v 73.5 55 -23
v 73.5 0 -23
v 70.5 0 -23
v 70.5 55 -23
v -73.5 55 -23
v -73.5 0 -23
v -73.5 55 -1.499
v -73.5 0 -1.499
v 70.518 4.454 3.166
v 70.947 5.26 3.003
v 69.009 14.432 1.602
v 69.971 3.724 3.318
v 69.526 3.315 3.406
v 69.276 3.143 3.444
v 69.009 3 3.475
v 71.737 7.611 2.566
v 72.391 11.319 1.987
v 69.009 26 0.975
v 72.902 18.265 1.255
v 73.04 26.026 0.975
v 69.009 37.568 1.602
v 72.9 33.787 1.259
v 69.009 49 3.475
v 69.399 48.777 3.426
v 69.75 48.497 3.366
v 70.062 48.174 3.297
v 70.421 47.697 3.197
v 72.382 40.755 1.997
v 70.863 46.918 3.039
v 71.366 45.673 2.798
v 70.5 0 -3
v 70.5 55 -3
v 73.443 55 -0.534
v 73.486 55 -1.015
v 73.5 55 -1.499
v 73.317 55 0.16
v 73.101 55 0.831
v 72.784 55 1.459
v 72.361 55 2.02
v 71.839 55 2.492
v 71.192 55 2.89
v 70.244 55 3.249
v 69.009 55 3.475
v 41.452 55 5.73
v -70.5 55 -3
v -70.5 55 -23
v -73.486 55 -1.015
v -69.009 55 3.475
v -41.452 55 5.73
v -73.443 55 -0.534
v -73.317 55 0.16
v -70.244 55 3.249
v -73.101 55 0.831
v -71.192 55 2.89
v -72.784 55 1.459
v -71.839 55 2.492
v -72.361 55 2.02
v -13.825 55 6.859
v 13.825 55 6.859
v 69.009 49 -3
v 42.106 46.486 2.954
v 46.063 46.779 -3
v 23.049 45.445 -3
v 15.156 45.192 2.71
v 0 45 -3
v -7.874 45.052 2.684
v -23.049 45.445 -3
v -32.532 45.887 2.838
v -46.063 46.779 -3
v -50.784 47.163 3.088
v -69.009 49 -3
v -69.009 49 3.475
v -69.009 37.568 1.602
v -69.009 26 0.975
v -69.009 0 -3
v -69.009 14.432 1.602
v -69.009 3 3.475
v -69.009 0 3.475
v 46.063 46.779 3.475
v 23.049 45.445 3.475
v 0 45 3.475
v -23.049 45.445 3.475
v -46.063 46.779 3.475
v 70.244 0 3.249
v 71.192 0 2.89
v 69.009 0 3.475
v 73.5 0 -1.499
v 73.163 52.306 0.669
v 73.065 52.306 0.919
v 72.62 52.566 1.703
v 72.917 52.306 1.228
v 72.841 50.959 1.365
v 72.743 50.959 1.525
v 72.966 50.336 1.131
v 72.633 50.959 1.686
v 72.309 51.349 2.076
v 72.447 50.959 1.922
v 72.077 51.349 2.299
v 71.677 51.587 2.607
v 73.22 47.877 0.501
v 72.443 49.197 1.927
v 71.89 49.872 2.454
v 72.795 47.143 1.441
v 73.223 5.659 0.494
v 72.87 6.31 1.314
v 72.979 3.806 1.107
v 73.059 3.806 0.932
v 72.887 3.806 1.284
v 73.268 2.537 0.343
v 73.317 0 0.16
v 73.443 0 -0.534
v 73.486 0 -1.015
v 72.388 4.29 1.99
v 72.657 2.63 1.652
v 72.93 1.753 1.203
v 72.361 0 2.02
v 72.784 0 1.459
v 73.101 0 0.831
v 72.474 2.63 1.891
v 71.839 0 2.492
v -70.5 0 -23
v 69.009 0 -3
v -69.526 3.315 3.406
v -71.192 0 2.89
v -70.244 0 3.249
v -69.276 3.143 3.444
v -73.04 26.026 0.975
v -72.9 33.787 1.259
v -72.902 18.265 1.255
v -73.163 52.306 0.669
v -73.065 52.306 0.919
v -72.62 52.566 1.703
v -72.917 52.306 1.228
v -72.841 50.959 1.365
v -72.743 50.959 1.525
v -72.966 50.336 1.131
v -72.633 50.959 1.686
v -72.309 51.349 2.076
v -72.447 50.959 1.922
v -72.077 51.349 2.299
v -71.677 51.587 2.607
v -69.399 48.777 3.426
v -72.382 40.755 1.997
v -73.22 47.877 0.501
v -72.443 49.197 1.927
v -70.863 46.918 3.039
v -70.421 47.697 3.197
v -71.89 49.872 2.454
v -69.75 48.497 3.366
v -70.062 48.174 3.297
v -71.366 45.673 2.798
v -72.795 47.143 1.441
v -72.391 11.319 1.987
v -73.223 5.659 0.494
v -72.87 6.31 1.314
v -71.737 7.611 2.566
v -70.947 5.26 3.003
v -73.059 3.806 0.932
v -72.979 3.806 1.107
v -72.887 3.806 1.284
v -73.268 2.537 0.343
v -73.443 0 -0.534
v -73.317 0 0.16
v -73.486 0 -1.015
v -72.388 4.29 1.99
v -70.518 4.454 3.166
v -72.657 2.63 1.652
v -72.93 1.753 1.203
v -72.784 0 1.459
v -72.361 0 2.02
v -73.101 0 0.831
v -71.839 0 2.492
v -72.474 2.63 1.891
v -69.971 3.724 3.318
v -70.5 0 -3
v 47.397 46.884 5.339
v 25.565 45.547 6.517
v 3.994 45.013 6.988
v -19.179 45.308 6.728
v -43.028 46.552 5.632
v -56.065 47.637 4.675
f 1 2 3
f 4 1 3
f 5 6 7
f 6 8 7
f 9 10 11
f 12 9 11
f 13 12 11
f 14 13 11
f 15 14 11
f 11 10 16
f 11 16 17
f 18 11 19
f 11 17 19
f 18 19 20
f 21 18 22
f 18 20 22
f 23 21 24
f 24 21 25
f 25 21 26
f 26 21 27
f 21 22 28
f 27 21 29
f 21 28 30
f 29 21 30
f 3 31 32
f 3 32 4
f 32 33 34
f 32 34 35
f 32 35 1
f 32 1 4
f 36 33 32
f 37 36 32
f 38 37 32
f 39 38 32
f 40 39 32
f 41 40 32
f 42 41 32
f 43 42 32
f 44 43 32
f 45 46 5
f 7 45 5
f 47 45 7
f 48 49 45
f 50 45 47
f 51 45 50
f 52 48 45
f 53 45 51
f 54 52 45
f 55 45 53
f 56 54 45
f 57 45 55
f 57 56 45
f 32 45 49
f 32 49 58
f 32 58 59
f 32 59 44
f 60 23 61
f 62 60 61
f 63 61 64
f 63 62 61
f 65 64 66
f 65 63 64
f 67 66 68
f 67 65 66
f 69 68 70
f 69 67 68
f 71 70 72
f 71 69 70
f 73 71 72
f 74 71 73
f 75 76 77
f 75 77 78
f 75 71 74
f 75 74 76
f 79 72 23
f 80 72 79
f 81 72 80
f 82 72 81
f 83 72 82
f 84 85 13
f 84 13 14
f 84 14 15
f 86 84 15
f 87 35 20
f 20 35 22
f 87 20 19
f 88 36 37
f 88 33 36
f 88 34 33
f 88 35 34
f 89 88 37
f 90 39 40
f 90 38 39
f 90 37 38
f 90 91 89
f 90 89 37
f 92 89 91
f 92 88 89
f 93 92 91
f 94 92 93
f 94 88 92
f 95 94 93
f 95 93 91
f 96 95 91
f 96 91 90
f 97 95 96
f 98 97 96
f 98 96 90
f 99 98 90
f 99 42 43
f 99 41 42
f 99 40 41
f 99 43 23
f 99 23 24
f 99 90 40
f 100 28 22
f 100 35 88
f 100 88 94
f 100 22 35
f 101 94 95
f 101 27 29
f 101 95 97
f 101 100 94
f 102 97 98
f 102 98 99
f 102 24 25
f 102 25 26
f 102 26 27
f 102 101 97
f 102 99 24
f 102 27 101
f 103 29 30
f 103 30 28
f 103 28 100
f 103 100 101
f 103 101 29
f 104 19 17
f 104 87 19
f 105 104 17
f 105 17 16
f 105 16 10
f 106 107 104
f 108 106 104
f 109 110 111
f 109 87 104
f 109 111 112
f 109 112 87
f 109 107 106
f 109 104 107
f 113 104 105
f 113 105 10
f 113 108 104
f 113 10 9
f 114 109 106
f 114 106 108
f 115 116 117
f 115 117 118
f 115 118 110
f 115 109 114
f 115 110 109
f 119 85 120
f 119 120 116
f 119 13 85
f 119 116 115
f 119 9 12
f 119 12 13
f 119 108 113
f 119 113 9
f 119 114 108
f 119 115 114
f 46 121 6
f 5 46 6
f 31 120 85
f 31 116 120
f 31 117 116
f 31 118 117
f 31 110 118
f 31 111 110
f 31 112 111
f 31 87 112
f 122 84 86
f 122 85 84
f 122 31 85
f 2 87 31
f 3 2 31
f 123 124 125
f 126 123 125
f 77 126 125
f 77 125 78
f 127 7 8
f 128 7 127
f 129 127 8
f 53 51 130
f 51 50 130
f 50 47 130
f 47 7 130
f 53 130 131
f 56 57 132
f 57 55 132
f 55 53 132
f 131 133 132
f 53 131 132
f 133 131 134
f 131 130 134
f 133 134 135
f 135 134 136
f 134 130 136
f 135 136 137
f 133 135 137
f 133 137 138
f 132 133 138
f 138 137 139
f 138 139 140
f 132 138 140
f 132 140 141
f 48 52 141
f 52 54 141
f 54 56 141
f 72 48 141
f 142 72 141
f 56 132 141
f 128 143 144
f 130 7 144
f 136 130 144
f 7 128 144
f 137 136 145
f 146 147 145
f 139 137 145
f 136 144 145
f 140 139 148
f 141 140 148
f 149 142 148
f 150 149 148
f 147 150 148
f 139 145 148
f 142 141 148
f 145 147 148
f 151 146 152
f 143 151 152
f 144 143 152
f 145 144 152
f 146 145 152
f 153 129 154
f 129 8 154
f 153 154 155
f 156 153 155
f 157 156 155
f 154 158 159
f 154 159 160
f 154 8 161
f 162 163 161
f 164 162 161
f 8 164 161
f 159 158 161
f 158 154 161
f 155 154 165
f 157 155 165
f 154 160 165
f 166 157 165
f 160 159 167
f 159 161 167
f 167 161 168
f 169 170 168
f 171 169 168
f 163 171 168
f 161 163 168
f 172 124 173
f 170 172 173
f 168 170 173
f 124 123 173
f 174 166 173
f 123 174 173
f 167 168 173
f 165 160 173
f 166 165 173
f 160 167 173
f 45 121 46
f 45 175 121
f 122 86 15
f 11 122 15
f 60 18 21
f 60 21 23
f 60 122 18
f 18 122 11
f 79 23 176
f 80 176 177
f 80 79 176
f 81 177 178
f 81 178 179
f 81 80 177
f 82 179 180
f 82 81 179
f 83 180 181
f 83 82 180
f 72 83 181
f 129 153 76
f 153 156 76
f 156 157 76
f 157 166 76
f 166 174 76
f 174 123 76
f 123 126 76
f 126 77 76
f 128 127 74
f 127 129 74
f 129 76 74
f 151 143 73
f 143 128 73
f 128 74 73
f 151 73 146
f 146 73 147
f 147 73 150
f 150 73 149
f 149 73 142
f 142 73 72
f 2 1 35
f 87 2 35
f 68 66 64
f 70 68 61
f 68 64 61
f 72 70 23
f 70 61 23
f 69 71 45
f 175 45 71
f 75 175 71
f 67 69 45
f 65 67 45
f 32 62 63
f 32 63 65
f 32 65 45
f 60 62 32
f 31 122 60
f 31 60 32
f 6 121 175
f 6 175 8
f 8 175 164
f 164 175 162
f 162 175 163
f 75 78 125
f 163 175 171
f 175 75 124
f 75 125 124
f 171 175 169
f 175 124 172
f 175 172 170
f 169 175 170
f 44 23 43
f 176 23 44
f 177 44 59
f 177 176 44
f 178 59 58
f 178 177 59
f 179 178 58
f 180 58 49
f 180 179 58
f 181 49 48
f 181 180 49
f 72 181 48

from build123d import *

# Parameters (mm, degrees)
BOSS_EXTRUDE1_DEPTH     = 55
CUT_EXTRUDE1_DEPTH      = 95.637466314
CUT_EXTRUDE1_DEPTH_BACK = 95.637466314
CUT_EXTRUDE2_DEPTH      = 158.489682338
CUT_EXTRUDE2_DEPTH_BACK = 158.489682338
SKETCH4_W               = 3
SKETCH4_H               = 55
BOSS_EXTRUDE2_DEPTH     = 10


with BuildPart() as part:
    # Sketch1 → Boss-Extrude1 (new body)
    with BuildSketch(Plane(origin=(0, 0, 0), x_dir=(1, 0, 0), z_dir=(0, 1, 0))):
        with BuildLine():
            Line((-73.5, 3), (-73.5, 13))
            Line((-73.5, 13), (-70.5, 13))
            Line((-70.5, 13), (-70.5, 3))
            Line((-70.5, 3), (70.5, 3))
            Line((70.5, 3), (70.5, 13))
            Line((70.5, 13), (73.5, 13))
            Line((73.5, 13), (73.5, 3))
            Line((73.5, 3), (73.5, -3))
            ThreePointArc((73.5, -3), (0, -7), (-73.5, -3))
            Line((-73.5, -3), (-73.5, 3))
        make_face()
    extrude(amount=BOSS_EXTRUDE1_DEPTH)

    # Fillet1
    # a fillet whose section is not a circle: 5 mm, written as the material it takes off along each edge
    with BuildSketch(Plane(origin=(73.5, -11.289002285, 3), x_dir=(0, 0, -1), z_dir=(0, 1, 0))) as fillet1_piece_1:
        with BuildLine():
            Bezier((4.498901921, 0), (-0.015132067, 0), (-0.475075473, 4.490540603), weights=[1, 1, 1])
            ThreePointArc((-0.475075473, 4.490540603), (-0.24128019, 2.24487437), (0, 0))
            Line((0, 0), (4.498901921, 0))
        make_face()
    extrude(amount=77.578004571, mode=Mode.SUBTRACT)
    with BuildSketch(Plane(origin=(-73.5, -11.289002285, 3), x_dir=(0, 0, -1), z_dir=(0, 1, 0))) as fillet1_piece_2:
        with BuildLine():
            Bezier((4.498901921, 0), (-0.015132067, 0), (-0.475075473, -4.490540603), weights=[1, 1, 1])
            ThreePointArc((-0.475075473, -4.490540603), (-0.24128019, -2.24487437), (0, 0))
            Line((0, 0), (4.498901921, 0))
        make_face()
    extrude(amount=77.578004571, mode=Mode.SUBTRACT)

    # Sketch2 → Cut-Extrude1 (cut, two sides: drawn at the far end of the back side and taken through both)
    with BuildSketch(Plane.XY.offset(10).offset(-CUT_EXTRUDE1_DEPTH_BACK)):
        with BuildLine():
            Line((-69.009459397, 49), (-69.009459397, 0))
            Line((-69.009459397, 0), (69.009459397, 0))
            Line((69.009459397, 0), (69.009459397, 49))
            ThreePointArc((69.009459397, 49), (0, 45), (-69.009459397, 49))
        make_face()
    extrude(amount=CUT_EXTRUDE1_DEPTH + CUT_EXTRUDE1_DEPTH_BACK, mode=Mode.SUBTRACT)

    # Sketch3 → Cut-Extrude2 (cut, two sides: drawn at the far end of the back side and taken through both)
    with BuildSketch(Plane.ZY.offset(73.5).offset(-CUT_EXTRUDE2_DEPTH_BACK)):
        with BuildLine():
            Line((3.475075473, 49), (3.475075473, 3))
            ThreePointArc((3.475075473, 3), (0.975075473, 26), (3.475075473, 49))
        make_face()
    extrude(amount=CUT_EXTRUDE2_DEPTH + CUT_EXTRUDE2_DEPTH_BACK, mode=Mode.SUBTRACT)

    # Sketch4 → Boss-Extrude2 (add)
    with BuildSketch(Plane(origin=(0, 0, -13), x_dir=(-1, 0, 0), z_dir=(0, 0, -1))):
        with Locations((72, 27.5)):
            Rectangle(SKETCH4_W, SKETCH4_H)
        with Locations((-72, 27.5)):
            Rectangle(SKETCH4_W, SKETCH4_H)
    extrude(amount=BOSS_EXTRUDE2_DEPTH)


solid = part.part
